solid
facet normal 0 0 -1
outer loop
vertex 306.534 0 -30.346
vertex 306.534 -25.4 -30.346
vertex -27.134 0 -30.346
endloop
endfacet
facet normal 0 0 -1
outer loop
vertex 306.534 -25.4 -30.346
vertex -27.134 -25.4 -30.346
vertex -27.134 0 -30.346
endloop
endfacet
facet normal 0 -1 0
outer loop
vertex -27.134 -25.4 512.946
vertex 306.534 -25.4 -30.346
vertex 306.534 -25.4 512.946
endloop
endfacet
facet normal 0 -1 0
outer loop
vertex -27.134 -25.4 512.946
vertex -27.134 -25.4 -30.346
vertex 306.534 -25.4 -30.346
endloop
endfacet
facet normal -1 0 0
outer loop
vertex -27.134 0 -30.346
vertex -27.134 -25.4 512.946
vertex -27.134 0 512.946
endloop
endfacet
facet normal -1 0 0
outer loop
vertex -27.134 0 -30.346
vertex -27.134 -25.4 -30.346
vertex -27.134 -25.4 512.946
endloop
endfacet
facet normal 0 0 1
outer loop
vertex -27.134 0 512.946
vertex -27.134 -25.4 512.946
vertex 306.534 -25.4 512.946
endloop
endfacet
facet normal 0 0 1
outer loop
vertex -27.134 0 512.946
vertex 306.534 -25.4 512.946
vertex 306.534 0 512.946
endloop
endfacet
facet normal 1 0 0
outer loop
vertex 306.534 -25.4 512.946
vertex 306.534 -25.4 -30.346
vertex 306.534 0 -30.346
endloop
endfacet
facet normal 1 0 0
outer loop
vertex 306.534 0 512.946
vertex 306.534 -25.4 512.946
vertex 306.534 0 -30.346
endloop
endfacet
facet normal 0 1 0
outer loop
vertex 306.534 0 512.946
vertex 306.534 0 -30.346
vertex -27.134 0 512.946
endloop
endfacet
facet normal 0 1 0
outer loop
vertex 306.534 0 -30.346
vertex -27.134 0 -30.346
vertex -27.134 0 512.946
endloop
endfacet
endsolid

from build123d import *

# Parameters (mm, degrees)
F0_W      = 54.267262
F0_H      = 60.692758
F1_DEPTH  = 25.4
F1_FACE_W = 54.267262
F1_FACE_H = 25.4
F2_DEPTH  = 482.6
F2_FACE_W = 25.4
F2_FACE_H = 543.292758
F3_DEPTH  = 279.4


with BuildPart() as f1:
    # F0 (on Front) → F1 (new body)
    with BuildSketch(Plane.XZ):
        Rectangle(F0_W, F0_H)
    extrude(amount=F1_DEPTH)

    # F1_face (on face) → F2 (join)
    with BuildSketch(Plane(origin=(0, -12.7, 30.346379), x_dir=(1, 0, 0), z_dir=(0, 0, 1))):
        Rectangle(F1_FACE_W, F1_FACE_H)
    extrude(amount=F2_DEPTH)

    # F2_face (on face) → F3 (join)
    with BuildSketch(Plane(origin=(27.133631, -12.7, 241.3), x_dir=(0, 1, 0), z_dir=(1, 0, 0))):
        Rectangle(F2_FACE_W, F2_FACE_H)
    extrude(amount=F3_DEPTH)


solid = f1.part
